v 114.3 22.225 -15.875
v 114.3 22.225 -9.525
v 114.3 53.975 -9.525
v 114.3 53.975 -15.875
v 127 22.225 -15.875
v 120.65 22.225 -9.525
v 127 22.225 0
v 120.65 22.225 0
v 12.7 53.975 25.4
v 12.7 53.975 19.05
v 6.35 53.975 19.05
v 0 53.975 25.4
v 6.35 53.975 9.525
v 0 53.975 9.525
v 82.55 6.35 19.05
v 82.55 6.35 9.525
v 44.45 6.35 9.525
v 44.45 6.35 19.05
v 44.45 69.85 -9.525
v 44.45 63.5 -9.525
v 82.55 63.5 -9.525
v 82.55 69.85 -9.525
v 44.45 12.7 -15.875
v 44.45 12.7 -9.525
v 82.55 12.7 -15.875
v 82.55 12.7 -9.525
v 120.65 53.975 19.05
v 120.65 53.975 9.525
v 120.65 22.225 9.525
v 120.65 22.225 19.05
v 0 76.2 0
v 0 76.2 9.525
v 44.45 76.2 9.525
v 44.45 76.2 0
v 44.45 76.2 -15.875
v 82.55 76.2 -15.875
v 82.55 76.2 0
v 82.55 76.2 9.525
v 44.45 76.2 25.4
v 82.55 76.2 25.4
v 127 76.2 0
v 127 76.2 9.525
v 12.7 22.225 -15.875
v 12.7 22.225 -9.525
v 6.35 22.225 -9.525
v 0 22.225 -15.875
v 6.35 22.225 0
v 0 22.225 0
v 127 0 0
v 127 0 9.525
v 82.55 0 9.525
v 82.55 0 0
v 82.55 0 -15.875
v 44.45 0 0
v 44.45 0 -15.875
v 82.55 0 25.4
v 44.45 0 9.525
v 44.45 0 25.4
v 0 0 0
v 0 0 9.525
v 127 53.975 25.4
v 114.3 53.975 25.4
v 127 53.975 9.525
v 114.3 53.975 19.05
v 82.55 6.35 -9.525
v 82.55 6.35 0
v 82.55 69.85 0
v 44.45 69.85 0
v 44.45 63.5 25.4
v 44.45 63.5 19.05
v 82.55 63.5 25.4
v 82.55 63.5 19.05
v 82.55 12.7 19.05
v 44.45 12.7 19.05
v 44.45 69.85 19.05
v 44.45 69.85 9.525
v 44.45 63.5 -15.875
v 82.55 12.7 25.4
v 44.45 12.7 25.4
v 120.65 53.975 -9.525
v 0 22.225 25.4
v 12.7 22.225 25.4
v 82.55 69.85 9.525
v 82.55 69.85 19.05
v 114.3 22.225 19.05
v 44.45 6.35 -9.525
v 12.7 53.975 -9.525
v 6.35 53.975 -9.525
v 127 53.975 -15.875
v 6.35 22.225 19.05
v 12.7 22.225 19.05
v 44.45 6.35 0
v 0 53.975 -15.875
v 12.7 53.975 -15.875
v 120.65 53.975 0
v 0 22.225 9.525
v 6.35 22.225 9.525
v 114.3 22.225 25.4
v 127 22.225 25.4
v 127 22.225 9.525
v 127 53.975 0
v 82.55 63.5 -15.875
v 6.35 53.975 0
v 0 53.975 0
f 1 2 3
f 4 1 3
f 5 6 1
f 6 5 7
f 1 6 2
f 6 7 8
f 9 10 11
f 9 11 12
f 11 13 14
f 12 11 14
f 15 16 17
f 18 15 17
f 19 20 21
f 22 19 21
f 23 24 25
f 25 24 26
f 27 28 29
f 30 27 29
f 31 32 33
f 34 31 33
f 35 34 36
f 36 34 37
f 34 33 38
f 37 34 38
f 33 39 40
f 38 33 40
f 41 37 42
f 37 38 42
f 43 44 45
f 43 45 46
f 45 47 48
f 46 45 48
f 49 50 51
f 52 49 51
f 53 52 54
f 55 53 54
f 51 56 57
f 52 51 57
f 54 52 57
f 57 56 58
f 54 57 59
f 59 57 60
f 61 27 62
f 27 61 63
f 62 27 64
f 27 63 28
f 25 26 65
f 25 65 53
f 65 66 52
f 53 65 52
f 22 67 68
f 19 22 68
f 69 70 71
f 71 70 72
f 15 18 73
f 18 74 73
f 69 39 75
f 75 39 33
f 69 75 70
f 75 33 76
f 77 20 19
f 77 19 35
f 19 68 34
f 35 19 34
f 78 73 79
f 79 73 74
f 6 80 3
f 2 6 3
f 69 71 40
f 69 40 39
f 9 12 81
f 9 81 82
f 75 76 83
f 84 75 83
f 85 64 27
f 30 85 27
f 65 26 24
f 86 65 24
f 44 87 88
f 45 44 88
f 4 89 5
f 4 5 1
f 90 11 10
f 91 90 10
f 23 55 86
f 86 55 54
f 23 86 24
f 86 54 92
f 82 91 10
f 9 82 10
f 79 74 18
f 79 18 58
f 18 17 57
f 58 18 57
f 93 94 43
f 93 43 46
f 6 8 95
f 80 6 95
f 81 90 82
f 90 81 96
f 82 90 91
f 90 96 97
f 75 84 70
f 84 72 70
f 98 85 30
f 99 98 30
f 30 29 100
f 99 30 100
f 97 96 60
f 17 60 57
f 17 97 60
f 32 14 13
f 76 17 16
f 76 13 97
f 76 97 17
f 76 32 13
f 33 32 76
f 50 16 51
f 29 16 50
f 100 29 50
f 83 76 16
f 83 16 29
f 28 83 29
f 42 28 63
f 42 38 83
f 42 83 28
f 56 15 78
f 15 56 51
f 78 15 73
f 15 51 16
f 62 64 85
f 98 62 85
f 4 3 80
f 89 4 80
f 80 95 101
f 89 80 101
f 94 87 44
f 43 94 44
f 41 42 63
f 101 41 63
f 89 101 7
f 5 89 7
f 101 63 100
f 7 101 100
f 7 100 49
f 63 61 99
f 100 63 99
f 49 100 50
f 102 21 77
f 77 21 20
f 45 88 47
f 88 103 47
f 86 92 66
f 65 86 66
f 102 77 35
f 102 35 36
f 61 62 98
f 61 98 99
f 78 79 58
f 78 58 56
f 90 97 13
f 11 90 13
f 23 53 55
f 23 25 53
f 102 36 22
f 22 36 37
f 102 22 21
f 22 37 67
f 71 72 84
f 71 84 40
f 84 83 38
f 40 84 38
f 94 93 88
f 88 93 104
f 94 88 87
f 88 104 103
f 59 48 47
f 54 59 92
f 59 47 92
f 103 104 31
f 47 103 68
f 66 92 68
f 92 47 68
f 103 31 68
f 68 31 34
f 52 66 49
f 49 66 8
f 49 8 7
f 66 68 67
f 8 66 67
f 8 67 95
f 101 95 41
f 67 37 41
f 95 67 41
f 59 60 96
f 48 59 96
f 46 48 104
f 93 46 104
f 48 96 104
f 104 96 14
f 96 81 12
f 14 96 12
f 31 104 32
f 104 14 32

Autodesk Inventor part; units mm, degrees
ref_plane "YZ Plane" through (0, 0, 0) normal (1, 0, 0) x (0, 1, 0)
ref_plane "XZ Plane" through (0, 0, 0) normal (0, 1, 0) x (-1, 0, 0)
ref_plane "XY Plane" through (0, 0, 0) normal (0, 0, 1) x (1, 0, 0)
sketch "Sketch1" plane through (0, 0, 0) normal (0, 0, 1) x (1, 0, 0)
  line L0 (0, 0) -> (127, 0)
  line L1 (127, 0) -> (127, 76.2)
  line L2 (127, 76.2) -> (0, 76.2)
  line L3 (0, 76.2) -> (0, 0)
  dimension "d0" = 127
  dimension "d1" = 76.2
extrude "Extrusion1" add sketch "Sketch1" along normal blind 9.525
sketch "Sketch2" plane through (0, 0, 9.525) normal (0, 0, 1) x (1, 0, 0)
  line L0 (127, 0) -> (0, 0) projected
  line L1 (0, 76.2) -> (127, 76.2) projected
  line L2 (44.45, 0) -> (82.55, 0)
  line L3 (82.55, 0) -> (82.55, 6.35)
  line L4 (82.55, 6.35) -> (44.45, 6.35)
  line L5 (44.45, 6.35) -> (44.45, 0)
  line L6 (63.5, 76.2) -> (63.5, 0) construction
  dimension "d4" = 38.1
  dimension "d5" = 6.35
extrude "Extrusion2" add sketch "Sketch2" along normal blind 9.525
ref_plane "Work Plane1" through (0, 38.1, 0) normal (0, 1, 0) x (1, 0, 0)
ref_plane "Work Plane2" through (63.5, 0, 0) normal (1, 0, 0) x (0, 0, -1)
sketch "Sketch3" plane through (0, 0, 9.525) normal (0, 0, 1) x (1, 0, 0)
  line L0 (0, 0) -> (0, 76.2) projected
  line L1 (127, 76.2) -> (127, 0) projected
  line L2 (127, 53.975) -> (120.65, 53.975)
  line L3 (120.65, 53.975) -> (120.65, 22.225)
  line L4 (120.65, 22.225) -> (127, 22.225)
  line L5 (127, 22.225) -> (127, 53.975)
  line L6 (0, 38.1) -> (127, 38.1) construction
  point P0 (63.5, 38.1)
  dimension "d8" = 31.75
  dimension "d9" = 6.35
extrude "Extrusion3" add sketch "Sketch3" along normal blind 9.525
sketch "Sketch4" plane through (0, 0, 19.05) normal (0, 0, 1) x (1, 0, 0)
  line L0 (44.45, 0) -> (82.55, 0)
  line L1 (82.55, 0) -> (82.55, 12.7)
  line L2 (82.55, 12.7) -> (44.45, 12.7)
  line L3 (44.45, 12.7) -> (44.45, 0)
  point P0 (44.45, 6.35)
  point P1 (82.55, 6.35)
  point P2 (0, 0)
  dimension "d12" = 38.1
  dimension "d13" = 38.1
  dimension "d14" = 12.7
extrude "Extrusion4" add sketch "Sketch4" along normal blind 6.35
sketch "Sketch5" plane through (0, 0, 19.05) normal (0, 0, 1) x (1, 0, 0)
  line L0 (127, 53.975) -> (114.3, 53.975)
  line L1 (114.3, 53.975) -> (114.3, 22.225)
  line L2 (114.3, 22.225) -> (127, 22.225)
  line L3 (127, 22.225) -> (127, 53.975)
  point P0 (0, 0)
  dimension "d17" = 31.75
  dimension "d18" = 31.75
  dimension "d19" = 12.7
extrude "Extrusion5" add sketch "Sketch5" along normal blind 6.35
mirror "Mirror3" about plane through (0, 38.1, 0) normal (0, 1, 0) of "Extrusion2", "Extrusion4"
mirror "Mirror4" about plane through (63.5, 0, 0) normal (1, 0, 0) of "Extrusion3", "Extrusion5"
ref_plane "Work Plane3" through (0, 0, 4.7625) normal (0, 0, 1) x (1, 0, 0)
mirror "Mirror5" about plane through (0, 0, 4.7625) normal (0, 0, 1) of "Extrusion2", "Extrusion4", "Mirror3", "Extrusion3", "Extrusion5", "Mirror4"
equation "\"d12\" = d13"
equation "\"d18\" = d17"
properties part number "Rover Electronics Raft"
